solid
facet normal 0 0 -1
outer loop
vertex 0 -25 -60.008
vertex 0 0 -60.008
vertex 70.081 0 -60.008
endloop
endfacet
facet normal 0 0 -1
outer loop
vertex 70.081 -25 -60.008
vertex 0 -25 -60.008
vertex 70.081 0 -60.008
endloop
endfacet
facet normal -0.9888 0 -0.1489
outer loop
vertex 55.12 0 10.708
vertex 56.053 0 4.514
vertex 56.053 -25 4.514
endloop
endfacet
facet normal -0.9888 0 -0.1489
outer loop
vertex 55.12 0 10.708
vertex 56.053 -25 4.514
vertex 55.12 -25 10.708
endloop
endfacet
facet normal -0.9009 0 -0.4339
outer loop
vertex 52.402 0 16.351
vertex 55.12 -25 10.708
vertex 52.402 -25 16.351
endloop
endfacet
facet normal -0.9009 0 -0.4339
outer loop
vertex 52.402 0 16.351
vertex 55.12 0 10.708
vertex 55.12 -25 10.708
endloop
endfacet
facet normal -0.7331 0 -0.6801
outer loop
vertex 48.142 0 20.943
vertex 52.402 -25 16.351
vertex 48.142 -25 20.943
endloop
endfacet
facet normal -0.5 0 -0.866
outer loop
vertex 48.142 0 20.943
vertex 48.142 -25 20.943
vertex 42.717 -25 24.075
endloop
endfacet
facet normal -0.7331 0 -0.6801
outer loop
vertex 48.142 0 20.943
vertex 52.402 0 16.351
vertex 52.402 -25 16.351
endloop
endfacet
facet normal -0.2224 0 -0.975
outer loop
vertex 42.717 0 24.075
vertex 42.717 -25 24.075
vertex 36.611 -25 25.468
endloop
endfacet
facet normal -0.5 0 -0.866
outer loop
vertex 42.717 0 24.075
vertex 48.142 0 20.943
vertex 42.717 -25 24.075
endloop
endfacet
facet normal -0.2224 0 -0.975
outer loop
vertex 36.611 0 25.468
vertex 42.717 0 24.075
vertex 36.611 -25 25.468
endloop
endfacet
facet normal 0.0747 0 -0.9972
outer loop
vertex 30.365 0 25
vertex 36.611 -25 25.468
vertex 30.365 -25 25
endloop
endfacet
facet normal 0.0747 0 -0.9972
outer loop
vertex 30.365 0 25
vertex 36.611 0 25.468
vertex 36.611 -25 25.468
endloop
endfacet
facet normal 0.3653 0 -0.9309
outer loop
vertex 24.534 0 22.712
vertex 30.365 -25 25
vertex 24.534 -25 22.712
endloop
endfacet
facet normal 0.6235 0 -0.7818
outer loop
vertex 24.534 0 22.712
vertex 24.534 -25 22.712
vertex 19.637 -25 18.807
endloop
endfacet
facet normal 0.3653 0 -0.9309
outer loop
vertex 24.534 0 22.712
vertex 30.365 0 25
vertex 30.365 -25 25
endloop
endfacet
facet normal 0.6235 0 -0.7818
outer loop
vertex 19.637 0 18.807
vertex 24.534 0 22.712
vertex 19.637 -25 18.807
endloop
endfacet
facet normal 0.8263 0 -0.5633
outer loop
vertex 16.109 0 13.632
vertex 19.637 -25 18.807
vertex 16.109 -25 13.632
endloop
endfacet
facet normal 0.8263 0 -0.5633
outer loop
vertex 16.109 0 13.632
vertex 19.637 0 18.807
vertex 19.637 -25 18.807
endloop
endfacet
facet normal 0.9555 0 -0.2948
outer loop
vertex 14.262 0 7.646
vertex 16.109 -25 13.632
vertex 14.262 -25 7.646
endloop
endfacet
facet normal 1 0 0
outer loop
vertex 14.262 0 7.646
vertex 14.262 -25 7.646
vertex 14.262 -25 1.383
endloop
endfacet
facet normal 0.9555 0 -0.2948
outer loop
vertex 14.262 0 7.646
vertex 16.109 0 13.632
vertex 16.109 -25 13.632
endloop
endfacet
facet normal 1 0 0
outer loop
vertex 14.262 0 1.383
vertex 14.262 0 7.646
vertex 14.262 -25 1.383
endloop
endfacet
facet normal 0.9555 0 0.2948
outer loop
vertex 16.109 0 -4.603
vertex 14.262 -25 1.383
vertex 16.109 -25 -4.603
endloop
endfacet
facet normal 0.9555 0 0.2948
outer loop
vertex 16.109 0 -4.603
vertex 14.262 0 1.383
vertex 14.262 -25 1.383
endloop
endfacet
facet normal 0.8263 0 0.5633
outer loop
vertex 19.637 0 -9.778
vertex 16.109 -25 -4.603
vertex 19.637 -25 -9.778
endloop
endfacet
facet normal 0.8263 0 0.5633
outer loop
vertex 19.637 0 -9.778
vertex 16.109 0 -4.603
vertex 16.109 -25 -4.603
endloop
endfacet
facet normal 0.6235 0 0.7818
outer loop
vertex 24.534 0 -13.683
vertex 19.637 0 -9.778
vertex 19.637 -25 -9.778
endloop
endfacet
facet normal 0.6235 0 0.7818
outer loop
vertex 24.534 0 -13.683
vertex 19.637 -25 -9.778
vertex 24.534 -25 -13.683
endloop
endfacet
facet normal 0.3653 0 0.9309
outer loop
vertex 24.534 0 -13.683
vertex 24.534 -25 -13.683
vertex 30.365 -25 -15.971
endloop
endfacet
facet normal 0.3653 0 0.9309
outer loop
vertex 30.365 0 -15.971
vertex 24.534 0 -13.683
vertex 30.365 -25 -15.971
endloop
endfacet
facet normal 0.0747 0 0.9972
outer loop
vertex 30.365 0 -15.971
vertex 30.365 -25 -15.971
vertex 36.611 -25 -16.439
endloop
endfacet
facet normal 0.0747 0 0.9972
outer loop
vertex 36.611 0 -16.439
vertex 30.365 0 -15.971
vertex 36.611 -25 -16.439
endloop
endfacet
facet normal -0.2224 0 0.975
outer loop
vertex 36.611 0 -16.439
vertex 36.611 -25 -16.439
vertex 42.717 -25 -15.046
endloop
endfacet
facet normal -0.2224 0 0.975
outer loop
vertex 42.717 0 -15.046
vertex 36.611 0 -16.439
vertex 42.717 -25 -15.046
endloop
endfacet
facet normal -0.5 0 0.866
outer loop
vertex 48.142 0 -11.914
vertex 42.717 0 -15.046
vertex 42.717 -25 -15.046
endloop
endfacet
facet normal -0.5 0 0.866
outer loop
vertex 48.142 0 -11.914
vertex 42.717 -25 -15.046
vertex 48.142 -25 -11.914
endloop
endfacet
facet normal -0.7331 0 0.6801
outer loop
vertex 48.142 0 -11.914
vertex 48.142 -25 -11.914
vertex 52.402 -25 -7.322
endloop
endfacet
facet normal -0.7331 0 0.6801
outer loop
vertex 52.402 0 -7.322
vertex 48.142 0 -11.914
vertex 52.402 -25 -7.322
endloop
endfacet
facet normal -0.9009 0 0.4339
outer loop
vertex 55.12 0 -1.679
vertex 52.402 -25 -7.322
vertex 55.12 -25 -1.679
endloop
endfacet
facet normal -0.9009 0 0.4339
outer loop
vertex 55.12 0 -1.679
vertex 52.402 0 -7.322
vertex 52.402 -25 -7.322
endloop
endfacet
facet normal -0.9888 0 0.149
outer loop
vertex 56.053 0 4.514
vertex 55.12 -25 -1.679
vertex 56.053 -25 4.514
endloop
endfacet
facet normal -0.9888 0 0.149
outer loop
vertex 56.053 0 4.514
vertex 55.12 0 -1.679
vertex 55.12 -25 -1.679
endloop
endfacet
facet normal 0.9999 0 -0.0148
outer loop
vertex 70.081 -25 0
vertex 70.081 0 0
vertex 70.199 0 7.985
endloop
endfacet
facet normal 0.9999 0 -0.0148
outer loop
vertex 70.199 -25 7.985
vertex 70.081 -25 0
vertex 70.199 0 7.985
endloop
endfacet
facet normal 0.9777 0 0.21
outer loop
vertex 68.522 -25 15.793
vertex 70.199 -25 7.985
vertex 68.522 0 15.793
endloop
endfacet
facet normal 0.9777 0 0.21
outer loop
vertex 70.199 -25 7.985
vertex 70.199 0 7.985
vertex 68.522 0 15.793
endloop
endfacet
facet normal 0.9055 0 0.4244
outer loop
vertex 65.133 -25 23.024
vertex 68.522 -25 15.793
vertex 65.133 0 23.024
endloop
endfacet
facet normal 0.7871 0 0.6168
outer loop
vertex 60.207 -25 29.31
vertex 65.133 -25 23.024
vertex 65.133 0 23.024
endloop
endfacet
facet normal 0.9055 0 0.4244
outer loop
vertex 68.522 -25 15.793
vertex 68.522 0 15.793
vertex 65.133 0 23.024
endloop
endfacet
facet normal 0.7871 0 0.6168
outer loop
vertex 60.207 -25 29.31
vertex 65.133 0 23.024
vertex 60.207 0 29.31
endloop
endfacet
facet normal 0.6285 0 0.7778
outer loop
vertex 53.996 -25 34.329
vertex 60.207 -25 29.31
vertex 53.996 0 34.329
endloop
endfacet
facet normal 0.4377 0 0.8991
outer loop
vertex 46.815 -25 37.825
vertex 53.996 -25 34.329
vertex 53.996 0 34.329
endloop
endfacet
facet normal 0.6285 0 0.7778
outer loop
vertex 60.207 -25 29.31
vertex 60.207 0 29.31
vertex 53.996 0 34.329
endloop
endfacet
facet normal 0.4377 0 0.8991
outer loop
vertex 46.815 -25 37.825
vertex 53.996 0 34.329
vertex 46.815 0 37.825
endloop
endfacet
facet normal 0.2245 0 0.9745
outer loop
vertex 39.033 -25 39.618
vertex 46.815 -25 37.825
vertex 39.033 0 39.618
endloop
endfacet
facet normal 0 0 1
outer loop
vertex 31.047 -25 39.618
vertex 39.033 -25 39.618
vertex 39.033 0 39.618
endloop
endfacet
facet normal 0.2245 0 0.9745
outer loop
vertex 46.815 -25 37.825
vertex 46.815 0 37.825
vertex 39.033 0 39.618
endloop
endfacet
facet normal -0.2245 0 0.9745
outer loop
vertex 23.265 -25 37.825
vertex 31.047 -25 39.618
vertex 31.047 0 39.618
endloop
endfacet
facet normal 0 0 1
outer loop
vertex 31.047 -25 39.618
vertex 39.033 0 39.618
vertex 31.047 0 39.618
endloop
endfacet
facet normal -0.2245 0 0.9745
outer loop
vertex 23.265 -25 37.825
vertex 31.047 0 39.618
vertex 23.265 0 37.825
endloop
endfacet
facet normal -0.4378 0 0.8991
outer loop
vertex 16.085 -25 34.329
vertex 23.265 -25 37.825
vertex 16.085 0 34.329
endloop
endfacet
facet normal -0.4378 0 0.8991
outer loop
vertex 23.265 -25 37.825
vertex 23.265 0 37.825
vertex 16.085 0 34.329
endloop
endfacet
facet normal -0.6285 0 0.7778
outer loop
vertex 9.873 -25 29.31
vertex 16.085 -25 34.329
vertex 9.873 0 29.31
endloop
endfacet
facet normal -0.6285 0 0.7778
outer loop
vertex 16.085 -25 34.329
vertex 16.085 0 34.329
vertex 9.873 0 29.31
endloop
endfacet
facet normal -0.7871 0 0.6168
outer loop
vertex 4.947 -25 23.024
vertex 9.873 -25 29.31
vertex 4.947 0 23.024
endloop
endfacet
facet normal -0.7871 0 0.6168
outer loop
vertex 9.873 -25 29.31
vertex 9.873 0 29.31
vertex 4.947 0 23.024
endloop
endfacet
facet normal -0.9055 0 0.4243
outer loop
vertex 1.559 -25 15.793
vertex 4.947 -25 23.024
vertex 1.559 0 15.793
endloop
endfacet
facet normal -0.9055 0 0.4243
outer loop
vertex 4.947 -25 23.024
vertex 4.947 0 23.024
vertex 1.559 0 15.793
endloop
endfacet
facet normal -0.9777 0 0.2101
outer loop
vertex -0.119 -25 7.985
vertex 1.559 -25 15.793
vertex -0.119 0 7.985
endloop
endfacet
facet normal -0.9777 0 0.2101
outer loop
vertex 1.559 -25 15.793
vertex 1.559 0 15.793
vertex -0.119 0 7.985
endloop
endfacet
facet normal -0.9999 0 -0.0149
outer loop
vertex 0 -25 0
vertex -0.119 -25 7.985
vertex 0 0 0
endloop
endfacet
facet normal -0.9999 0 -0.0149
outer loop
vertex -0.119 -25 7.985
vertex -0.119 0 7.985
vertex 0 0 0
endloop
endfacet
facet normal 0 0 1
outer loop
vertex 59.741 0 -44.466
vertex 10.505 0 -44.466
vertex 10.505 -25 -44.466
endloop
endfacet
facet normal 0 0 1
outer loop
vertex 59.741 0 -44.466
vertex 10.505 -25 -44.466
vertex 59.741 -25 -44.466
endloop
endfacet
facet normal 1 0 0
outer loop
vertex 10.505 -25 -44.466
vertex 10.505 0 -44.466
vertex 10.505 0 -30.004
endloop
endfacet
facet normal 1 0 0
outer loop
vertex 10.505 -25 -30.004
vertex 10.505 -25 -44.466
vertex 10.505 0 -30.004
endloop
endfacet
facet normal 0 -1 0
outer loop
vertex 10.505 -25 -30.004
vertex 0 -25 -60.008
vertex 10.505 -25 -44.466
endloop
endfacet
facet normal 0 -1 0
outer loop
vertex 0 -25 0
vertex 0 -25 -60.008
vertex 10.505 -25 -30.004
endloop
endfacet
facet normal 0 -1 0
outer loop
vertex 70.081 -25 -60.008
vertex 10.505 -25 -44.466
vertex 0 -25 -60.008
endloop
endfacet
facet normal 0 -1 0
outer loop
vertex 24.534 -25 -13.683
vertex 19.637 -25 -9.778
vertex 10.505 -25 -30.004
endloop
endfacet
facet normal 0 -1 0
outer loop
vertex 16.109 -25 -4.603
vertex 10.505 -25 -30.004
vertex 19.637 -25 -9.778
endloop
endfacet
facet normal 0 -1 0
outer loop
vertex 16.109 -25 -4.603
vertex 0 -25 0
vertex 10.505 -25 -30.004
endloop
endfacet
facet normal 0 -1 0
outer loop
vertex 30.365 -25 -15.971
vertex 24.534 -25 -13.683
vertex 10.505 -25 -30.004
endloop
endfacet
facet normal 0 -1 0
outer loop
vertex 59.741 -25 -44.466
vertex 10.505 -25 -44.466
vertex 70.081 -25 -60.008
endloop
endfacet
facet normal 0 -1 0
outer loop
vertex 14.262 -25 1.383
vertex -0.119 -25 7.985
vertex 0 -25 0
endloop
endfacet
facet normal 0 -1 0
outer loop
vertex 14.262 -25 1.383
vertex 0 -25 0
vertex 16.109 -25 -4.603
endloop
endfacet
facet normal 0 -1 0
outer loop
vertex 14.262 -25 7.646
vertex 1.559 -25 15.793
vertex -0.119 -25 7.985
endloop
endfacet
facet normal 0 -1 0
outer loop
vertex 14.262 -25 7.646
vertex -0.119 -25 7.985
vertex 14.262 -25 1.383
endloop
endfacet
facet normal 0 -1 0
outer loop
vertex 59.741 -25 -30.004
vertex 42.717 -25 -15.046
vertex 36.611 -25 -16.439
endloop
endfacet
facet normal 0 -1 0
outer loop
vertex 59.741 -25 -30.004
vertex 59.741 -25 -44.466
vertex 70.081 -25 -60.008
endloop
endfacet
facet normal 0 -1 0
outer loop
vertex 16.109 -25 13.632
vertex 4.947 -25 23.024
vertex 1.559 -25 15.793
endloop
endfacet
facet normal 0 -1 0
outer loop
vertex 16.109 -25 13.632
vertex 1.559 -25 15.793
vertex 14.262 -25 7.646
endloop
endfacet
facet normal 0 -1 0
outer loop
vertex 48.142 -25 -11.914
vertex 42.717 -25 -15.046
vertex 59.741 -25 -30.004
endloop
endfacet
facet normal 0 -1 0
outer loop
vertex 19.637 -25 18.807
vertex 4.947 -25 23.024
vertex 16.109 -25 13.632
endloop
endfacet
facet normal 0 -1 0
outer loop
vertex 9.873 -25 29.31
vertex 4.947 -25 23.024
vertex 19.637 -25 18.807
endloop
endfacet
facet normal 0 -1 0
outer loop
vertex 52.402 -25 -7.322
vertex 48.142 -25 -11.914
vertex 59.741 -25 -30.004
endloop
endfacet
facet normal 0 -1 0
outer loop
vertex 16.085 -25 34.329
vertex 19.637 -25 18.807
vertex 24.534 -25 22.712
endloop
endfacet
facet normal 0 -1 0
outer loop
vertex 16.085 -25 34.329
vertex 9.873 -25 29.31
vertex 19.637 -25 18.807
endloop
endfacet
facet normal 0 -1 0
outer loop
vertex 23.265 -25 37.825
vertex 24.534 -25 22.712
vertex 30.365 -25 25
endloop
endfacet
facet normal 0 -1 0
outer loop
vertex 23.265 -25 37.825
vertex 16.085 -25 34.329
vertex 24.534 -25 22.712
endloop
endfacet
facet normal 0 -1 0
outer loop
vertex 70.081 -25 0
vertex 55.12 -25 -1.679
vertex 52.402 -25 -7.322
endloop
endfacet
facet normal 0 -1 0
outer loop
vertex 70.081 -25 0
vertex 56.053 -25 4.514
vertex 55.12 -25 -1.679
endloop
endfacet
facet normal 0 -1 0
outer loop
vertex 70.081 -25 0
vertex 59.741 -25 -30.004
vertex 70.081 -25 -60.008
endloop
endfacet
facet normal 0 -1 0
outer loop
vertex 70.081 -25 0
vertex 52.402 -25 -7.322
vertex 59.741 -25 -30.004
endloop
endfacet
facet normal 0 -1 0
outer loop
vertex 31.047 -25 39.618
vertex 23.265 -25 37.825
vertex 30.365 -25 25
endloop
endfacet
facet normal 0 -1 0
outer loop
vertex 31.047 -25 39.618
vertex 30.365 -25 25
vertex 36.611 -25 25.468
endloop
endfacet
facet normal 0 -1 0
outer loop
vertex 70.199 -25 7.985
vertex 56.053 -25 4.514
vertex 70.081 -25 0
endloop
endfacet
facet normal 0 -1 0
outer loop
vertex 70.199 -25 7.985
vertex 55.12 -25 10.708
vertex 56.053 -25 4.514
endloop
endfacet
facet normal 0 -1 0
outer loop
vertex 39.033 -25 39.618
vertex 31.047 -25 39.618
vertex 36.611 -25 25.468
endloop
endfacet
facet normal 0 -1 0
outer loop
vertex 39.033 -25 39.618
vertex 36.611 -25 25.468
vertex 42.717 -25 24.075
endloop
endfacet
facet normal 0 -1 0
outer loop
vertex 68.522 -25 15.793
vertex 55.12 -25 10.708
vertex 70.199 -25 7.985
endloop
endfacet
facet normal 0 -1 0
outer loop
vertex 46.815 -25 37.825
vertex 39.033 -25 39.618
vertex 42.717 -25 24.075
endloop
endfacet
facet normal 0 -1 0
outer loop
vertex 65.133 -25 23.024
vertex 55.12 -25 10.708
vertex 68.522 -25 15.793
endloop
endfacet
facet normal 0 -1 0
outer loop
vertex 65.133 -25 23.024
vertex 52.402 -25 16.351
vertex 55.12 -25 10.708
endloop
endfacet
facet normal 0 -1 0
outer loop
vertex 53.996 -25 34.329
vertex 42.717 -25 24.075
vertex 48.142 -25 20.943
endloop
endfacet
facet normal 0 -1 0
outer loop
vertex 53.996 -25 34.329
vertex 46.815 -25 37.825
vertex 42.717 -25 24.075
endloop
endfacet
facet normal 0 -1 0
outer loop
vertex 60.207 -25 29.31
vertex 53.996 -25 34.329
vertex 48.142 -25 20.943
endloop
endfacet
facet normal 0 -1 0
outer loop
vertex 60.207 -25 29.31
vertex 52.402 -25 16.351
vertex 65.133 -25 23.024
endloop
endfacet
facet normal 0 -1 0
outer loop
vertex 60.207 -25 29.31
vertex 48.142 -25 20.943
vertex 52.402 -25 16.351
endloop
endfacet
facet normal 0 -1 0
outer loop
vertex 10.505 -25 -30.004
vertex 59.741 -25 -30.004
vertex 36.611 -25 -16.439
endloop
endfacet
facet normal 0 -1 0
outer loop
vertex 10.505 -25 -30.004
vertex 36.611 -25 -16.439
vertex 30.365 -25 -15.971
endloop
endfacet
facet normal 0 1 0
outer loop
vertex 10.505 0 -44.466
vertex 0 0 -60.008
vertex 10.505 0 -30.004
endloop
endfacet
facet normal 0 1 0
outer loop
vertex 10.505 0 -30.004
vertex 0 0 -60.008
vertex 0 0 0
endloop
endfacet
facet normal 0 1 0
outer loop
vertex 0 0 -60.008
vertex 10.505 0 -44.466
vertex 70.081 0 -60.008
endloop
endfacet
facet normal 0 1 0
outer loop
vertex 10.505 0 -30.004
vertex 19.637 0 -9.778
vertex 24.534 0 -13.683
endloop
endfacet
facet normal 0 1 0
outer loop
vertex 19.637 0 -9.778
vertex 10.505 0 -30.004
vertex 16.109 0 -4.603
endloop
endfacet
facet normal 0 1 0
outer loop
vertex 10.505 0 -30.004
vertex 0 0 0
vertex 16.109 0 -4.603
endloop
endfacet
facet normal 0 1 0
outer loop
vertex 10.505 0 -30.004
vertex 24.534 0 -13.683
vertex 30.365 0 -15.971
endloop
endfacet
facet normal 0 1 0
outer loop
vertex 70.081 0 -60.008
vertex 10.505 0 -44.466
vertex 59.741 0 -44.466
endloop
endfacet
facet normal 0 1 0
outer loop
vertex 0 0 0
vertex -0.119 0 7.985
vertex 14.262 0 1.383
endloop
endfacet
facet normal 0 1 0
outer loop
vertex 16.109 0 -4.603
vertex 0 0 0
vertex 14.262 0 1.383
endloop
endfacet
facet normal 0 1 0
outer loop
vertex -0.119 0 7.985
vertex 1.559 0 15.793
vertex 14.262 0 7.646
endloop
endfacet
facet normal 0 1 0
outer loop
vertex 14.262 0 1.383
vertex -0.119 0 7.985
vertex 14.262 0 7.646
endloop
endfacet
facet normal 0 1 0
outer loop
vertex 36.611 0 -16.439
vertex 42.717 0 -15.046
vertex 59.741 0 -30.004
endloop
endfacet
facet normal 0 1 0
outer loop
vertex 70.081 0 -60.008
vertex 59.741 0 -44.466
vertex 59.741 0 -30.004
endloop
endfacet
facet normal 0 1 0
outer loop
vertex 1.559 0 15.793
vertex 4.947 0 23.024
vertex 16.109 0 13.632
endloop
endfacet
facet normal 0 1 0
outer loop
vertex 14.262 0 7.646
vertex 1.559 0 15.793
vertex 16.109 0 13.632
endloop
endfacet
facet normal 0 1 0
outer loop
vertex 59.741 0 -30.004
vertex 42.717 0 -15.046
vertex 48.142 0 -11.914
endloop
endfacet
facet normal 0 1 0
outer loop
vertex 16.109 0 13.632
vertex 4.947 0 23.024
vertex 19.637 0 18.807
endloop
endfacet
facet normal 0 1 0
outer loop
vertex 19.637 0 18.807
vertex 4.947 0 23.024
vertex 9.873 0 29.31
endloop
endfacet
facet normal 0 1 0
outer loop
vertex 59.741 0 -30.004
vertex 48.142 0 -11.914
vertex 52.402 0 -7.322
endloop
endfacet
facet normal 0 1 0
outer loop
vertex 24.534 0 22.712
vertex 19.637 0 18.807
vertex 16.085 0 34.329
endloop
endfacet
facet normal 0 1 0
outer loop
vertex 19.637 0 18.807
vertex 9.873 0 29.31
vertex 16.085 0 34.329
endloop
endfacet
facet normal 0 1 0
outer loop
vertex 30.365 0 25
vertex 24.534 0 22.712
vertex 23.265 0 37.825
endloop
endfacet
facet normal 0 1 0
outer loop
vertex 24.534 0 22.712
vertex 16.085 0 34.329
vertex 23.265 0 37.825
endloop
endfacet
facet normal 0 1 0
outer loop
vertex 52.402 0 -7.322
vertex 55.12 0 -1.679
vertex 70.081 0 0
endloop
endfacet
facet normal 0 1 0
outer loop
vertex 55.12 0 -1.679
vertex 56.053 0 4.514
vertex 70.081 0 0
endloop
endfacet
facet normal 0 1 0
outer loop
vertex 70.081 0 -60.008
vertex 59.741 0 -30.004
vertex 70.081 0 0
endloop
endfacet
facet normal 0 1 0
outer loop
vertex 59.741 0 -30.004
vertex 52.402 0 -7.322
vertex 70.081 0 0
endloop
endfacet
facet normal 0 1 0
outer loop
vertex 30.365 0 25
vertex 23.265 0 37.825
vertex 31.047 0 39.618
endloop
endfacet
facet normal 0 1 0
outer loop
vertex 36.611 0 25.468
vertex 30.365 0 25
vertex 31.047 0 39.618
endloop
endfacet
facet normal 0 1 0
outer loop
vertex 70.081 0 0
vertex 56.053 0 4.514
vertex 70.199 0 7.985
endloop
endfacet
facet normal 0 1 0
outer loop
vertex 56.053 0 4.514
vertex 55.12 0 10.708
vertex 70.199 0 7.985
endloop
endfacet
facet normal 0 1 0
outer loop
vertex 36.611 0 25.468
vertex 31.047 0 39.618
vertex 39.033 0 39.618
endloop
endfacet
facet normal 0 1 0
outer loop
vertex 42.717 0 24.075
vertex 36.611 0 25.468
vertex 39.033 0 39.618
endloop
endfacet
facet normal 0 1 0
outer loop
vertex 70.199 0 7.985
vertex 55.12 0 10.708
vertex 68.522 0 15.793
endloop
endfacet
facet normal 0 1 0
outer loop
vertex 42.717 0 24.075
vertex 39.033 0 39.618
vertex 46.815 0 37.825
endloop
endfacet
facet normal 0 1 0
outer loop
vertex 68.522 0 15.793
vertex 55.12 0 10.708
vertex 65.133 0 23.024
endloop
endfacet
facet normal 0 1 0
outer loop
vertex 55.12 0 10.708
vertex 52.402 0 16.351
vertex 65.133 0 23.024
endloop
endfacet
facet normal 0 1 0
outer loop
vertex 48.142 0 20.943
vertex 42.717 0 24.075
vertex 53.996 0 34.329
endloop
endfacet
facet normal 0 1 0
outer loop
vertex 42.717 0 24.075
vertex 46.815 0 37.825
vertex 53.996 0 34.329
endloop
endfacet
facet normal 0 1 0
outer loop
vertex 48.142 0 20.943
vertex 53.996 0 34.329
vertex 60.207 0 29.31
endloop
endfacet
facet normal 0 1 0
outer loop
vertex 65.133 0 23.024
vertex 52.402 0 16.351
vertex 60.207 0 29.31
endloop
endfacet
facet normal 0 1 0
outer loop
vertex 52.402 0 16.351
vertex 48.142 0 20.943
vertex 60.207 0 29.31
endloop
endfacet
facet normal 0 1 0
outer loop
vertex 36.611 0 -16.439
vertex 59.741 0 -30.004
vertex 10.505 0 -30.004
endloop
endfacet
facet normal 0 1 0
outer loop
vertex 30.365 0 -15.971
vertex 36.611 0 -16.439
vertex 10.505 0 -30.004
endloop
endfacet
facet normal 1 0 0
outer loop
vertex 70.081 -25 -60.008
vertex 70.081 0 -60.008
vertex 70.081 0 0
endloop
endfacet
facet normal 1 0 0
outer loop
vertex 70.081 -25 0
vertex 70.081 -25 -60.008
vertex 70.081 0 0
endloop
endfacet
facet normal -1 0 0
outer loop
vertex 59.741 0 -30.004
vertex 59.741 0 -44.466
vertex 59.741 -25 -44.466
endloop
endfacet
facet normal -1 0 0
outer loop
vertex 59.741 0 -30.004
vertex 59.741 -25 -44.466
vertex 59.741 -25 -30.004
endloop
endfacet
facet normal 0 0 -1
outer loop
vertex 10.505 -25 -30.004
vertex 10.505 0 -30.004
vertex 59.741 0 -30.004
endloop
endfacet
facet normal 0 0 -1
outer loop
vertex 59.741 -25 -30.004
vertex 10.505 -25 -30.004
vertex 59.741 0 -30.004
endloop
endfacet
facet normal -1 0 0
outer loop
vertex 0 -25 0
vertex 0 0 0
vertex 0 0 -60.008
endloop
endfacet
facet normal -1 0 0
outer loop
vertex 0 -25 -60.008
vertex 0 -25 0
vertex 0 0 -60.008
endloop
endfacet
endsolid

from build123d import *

# Parameters (mm, degrees)
F0_W     = 49.235915
F0_H     = 14.462238
F0_R     = 21.012686
F1_DEPTH = 25


with BuildPart() as f1:
    # F0 (on Front) → F1 (new body)
    with BuildSketch(Plane.XZ):
        with BuildLine():
            ThreePointArc((70.080705, 0), (35.040352, 39.844464), (0, 0))
            Line((0, 0), (0, -60.007501))
            Line((0, -60.007501), (70.080705, -60.007501))
            Line((70.080705, -60.007501), (70.080705, 0))
        make_face()
        with Locations((35.122868, -37.23487)):
            Rectangle(F0_W, F0_H, mode=Mode.SUBTRACT)
        with Locations((35.040352, 4.514492)):
            Circle(F0_R, mode=Mode.SUBTRACT)
    extrude(amount=F1_DEPTH)


solid = f1.part
